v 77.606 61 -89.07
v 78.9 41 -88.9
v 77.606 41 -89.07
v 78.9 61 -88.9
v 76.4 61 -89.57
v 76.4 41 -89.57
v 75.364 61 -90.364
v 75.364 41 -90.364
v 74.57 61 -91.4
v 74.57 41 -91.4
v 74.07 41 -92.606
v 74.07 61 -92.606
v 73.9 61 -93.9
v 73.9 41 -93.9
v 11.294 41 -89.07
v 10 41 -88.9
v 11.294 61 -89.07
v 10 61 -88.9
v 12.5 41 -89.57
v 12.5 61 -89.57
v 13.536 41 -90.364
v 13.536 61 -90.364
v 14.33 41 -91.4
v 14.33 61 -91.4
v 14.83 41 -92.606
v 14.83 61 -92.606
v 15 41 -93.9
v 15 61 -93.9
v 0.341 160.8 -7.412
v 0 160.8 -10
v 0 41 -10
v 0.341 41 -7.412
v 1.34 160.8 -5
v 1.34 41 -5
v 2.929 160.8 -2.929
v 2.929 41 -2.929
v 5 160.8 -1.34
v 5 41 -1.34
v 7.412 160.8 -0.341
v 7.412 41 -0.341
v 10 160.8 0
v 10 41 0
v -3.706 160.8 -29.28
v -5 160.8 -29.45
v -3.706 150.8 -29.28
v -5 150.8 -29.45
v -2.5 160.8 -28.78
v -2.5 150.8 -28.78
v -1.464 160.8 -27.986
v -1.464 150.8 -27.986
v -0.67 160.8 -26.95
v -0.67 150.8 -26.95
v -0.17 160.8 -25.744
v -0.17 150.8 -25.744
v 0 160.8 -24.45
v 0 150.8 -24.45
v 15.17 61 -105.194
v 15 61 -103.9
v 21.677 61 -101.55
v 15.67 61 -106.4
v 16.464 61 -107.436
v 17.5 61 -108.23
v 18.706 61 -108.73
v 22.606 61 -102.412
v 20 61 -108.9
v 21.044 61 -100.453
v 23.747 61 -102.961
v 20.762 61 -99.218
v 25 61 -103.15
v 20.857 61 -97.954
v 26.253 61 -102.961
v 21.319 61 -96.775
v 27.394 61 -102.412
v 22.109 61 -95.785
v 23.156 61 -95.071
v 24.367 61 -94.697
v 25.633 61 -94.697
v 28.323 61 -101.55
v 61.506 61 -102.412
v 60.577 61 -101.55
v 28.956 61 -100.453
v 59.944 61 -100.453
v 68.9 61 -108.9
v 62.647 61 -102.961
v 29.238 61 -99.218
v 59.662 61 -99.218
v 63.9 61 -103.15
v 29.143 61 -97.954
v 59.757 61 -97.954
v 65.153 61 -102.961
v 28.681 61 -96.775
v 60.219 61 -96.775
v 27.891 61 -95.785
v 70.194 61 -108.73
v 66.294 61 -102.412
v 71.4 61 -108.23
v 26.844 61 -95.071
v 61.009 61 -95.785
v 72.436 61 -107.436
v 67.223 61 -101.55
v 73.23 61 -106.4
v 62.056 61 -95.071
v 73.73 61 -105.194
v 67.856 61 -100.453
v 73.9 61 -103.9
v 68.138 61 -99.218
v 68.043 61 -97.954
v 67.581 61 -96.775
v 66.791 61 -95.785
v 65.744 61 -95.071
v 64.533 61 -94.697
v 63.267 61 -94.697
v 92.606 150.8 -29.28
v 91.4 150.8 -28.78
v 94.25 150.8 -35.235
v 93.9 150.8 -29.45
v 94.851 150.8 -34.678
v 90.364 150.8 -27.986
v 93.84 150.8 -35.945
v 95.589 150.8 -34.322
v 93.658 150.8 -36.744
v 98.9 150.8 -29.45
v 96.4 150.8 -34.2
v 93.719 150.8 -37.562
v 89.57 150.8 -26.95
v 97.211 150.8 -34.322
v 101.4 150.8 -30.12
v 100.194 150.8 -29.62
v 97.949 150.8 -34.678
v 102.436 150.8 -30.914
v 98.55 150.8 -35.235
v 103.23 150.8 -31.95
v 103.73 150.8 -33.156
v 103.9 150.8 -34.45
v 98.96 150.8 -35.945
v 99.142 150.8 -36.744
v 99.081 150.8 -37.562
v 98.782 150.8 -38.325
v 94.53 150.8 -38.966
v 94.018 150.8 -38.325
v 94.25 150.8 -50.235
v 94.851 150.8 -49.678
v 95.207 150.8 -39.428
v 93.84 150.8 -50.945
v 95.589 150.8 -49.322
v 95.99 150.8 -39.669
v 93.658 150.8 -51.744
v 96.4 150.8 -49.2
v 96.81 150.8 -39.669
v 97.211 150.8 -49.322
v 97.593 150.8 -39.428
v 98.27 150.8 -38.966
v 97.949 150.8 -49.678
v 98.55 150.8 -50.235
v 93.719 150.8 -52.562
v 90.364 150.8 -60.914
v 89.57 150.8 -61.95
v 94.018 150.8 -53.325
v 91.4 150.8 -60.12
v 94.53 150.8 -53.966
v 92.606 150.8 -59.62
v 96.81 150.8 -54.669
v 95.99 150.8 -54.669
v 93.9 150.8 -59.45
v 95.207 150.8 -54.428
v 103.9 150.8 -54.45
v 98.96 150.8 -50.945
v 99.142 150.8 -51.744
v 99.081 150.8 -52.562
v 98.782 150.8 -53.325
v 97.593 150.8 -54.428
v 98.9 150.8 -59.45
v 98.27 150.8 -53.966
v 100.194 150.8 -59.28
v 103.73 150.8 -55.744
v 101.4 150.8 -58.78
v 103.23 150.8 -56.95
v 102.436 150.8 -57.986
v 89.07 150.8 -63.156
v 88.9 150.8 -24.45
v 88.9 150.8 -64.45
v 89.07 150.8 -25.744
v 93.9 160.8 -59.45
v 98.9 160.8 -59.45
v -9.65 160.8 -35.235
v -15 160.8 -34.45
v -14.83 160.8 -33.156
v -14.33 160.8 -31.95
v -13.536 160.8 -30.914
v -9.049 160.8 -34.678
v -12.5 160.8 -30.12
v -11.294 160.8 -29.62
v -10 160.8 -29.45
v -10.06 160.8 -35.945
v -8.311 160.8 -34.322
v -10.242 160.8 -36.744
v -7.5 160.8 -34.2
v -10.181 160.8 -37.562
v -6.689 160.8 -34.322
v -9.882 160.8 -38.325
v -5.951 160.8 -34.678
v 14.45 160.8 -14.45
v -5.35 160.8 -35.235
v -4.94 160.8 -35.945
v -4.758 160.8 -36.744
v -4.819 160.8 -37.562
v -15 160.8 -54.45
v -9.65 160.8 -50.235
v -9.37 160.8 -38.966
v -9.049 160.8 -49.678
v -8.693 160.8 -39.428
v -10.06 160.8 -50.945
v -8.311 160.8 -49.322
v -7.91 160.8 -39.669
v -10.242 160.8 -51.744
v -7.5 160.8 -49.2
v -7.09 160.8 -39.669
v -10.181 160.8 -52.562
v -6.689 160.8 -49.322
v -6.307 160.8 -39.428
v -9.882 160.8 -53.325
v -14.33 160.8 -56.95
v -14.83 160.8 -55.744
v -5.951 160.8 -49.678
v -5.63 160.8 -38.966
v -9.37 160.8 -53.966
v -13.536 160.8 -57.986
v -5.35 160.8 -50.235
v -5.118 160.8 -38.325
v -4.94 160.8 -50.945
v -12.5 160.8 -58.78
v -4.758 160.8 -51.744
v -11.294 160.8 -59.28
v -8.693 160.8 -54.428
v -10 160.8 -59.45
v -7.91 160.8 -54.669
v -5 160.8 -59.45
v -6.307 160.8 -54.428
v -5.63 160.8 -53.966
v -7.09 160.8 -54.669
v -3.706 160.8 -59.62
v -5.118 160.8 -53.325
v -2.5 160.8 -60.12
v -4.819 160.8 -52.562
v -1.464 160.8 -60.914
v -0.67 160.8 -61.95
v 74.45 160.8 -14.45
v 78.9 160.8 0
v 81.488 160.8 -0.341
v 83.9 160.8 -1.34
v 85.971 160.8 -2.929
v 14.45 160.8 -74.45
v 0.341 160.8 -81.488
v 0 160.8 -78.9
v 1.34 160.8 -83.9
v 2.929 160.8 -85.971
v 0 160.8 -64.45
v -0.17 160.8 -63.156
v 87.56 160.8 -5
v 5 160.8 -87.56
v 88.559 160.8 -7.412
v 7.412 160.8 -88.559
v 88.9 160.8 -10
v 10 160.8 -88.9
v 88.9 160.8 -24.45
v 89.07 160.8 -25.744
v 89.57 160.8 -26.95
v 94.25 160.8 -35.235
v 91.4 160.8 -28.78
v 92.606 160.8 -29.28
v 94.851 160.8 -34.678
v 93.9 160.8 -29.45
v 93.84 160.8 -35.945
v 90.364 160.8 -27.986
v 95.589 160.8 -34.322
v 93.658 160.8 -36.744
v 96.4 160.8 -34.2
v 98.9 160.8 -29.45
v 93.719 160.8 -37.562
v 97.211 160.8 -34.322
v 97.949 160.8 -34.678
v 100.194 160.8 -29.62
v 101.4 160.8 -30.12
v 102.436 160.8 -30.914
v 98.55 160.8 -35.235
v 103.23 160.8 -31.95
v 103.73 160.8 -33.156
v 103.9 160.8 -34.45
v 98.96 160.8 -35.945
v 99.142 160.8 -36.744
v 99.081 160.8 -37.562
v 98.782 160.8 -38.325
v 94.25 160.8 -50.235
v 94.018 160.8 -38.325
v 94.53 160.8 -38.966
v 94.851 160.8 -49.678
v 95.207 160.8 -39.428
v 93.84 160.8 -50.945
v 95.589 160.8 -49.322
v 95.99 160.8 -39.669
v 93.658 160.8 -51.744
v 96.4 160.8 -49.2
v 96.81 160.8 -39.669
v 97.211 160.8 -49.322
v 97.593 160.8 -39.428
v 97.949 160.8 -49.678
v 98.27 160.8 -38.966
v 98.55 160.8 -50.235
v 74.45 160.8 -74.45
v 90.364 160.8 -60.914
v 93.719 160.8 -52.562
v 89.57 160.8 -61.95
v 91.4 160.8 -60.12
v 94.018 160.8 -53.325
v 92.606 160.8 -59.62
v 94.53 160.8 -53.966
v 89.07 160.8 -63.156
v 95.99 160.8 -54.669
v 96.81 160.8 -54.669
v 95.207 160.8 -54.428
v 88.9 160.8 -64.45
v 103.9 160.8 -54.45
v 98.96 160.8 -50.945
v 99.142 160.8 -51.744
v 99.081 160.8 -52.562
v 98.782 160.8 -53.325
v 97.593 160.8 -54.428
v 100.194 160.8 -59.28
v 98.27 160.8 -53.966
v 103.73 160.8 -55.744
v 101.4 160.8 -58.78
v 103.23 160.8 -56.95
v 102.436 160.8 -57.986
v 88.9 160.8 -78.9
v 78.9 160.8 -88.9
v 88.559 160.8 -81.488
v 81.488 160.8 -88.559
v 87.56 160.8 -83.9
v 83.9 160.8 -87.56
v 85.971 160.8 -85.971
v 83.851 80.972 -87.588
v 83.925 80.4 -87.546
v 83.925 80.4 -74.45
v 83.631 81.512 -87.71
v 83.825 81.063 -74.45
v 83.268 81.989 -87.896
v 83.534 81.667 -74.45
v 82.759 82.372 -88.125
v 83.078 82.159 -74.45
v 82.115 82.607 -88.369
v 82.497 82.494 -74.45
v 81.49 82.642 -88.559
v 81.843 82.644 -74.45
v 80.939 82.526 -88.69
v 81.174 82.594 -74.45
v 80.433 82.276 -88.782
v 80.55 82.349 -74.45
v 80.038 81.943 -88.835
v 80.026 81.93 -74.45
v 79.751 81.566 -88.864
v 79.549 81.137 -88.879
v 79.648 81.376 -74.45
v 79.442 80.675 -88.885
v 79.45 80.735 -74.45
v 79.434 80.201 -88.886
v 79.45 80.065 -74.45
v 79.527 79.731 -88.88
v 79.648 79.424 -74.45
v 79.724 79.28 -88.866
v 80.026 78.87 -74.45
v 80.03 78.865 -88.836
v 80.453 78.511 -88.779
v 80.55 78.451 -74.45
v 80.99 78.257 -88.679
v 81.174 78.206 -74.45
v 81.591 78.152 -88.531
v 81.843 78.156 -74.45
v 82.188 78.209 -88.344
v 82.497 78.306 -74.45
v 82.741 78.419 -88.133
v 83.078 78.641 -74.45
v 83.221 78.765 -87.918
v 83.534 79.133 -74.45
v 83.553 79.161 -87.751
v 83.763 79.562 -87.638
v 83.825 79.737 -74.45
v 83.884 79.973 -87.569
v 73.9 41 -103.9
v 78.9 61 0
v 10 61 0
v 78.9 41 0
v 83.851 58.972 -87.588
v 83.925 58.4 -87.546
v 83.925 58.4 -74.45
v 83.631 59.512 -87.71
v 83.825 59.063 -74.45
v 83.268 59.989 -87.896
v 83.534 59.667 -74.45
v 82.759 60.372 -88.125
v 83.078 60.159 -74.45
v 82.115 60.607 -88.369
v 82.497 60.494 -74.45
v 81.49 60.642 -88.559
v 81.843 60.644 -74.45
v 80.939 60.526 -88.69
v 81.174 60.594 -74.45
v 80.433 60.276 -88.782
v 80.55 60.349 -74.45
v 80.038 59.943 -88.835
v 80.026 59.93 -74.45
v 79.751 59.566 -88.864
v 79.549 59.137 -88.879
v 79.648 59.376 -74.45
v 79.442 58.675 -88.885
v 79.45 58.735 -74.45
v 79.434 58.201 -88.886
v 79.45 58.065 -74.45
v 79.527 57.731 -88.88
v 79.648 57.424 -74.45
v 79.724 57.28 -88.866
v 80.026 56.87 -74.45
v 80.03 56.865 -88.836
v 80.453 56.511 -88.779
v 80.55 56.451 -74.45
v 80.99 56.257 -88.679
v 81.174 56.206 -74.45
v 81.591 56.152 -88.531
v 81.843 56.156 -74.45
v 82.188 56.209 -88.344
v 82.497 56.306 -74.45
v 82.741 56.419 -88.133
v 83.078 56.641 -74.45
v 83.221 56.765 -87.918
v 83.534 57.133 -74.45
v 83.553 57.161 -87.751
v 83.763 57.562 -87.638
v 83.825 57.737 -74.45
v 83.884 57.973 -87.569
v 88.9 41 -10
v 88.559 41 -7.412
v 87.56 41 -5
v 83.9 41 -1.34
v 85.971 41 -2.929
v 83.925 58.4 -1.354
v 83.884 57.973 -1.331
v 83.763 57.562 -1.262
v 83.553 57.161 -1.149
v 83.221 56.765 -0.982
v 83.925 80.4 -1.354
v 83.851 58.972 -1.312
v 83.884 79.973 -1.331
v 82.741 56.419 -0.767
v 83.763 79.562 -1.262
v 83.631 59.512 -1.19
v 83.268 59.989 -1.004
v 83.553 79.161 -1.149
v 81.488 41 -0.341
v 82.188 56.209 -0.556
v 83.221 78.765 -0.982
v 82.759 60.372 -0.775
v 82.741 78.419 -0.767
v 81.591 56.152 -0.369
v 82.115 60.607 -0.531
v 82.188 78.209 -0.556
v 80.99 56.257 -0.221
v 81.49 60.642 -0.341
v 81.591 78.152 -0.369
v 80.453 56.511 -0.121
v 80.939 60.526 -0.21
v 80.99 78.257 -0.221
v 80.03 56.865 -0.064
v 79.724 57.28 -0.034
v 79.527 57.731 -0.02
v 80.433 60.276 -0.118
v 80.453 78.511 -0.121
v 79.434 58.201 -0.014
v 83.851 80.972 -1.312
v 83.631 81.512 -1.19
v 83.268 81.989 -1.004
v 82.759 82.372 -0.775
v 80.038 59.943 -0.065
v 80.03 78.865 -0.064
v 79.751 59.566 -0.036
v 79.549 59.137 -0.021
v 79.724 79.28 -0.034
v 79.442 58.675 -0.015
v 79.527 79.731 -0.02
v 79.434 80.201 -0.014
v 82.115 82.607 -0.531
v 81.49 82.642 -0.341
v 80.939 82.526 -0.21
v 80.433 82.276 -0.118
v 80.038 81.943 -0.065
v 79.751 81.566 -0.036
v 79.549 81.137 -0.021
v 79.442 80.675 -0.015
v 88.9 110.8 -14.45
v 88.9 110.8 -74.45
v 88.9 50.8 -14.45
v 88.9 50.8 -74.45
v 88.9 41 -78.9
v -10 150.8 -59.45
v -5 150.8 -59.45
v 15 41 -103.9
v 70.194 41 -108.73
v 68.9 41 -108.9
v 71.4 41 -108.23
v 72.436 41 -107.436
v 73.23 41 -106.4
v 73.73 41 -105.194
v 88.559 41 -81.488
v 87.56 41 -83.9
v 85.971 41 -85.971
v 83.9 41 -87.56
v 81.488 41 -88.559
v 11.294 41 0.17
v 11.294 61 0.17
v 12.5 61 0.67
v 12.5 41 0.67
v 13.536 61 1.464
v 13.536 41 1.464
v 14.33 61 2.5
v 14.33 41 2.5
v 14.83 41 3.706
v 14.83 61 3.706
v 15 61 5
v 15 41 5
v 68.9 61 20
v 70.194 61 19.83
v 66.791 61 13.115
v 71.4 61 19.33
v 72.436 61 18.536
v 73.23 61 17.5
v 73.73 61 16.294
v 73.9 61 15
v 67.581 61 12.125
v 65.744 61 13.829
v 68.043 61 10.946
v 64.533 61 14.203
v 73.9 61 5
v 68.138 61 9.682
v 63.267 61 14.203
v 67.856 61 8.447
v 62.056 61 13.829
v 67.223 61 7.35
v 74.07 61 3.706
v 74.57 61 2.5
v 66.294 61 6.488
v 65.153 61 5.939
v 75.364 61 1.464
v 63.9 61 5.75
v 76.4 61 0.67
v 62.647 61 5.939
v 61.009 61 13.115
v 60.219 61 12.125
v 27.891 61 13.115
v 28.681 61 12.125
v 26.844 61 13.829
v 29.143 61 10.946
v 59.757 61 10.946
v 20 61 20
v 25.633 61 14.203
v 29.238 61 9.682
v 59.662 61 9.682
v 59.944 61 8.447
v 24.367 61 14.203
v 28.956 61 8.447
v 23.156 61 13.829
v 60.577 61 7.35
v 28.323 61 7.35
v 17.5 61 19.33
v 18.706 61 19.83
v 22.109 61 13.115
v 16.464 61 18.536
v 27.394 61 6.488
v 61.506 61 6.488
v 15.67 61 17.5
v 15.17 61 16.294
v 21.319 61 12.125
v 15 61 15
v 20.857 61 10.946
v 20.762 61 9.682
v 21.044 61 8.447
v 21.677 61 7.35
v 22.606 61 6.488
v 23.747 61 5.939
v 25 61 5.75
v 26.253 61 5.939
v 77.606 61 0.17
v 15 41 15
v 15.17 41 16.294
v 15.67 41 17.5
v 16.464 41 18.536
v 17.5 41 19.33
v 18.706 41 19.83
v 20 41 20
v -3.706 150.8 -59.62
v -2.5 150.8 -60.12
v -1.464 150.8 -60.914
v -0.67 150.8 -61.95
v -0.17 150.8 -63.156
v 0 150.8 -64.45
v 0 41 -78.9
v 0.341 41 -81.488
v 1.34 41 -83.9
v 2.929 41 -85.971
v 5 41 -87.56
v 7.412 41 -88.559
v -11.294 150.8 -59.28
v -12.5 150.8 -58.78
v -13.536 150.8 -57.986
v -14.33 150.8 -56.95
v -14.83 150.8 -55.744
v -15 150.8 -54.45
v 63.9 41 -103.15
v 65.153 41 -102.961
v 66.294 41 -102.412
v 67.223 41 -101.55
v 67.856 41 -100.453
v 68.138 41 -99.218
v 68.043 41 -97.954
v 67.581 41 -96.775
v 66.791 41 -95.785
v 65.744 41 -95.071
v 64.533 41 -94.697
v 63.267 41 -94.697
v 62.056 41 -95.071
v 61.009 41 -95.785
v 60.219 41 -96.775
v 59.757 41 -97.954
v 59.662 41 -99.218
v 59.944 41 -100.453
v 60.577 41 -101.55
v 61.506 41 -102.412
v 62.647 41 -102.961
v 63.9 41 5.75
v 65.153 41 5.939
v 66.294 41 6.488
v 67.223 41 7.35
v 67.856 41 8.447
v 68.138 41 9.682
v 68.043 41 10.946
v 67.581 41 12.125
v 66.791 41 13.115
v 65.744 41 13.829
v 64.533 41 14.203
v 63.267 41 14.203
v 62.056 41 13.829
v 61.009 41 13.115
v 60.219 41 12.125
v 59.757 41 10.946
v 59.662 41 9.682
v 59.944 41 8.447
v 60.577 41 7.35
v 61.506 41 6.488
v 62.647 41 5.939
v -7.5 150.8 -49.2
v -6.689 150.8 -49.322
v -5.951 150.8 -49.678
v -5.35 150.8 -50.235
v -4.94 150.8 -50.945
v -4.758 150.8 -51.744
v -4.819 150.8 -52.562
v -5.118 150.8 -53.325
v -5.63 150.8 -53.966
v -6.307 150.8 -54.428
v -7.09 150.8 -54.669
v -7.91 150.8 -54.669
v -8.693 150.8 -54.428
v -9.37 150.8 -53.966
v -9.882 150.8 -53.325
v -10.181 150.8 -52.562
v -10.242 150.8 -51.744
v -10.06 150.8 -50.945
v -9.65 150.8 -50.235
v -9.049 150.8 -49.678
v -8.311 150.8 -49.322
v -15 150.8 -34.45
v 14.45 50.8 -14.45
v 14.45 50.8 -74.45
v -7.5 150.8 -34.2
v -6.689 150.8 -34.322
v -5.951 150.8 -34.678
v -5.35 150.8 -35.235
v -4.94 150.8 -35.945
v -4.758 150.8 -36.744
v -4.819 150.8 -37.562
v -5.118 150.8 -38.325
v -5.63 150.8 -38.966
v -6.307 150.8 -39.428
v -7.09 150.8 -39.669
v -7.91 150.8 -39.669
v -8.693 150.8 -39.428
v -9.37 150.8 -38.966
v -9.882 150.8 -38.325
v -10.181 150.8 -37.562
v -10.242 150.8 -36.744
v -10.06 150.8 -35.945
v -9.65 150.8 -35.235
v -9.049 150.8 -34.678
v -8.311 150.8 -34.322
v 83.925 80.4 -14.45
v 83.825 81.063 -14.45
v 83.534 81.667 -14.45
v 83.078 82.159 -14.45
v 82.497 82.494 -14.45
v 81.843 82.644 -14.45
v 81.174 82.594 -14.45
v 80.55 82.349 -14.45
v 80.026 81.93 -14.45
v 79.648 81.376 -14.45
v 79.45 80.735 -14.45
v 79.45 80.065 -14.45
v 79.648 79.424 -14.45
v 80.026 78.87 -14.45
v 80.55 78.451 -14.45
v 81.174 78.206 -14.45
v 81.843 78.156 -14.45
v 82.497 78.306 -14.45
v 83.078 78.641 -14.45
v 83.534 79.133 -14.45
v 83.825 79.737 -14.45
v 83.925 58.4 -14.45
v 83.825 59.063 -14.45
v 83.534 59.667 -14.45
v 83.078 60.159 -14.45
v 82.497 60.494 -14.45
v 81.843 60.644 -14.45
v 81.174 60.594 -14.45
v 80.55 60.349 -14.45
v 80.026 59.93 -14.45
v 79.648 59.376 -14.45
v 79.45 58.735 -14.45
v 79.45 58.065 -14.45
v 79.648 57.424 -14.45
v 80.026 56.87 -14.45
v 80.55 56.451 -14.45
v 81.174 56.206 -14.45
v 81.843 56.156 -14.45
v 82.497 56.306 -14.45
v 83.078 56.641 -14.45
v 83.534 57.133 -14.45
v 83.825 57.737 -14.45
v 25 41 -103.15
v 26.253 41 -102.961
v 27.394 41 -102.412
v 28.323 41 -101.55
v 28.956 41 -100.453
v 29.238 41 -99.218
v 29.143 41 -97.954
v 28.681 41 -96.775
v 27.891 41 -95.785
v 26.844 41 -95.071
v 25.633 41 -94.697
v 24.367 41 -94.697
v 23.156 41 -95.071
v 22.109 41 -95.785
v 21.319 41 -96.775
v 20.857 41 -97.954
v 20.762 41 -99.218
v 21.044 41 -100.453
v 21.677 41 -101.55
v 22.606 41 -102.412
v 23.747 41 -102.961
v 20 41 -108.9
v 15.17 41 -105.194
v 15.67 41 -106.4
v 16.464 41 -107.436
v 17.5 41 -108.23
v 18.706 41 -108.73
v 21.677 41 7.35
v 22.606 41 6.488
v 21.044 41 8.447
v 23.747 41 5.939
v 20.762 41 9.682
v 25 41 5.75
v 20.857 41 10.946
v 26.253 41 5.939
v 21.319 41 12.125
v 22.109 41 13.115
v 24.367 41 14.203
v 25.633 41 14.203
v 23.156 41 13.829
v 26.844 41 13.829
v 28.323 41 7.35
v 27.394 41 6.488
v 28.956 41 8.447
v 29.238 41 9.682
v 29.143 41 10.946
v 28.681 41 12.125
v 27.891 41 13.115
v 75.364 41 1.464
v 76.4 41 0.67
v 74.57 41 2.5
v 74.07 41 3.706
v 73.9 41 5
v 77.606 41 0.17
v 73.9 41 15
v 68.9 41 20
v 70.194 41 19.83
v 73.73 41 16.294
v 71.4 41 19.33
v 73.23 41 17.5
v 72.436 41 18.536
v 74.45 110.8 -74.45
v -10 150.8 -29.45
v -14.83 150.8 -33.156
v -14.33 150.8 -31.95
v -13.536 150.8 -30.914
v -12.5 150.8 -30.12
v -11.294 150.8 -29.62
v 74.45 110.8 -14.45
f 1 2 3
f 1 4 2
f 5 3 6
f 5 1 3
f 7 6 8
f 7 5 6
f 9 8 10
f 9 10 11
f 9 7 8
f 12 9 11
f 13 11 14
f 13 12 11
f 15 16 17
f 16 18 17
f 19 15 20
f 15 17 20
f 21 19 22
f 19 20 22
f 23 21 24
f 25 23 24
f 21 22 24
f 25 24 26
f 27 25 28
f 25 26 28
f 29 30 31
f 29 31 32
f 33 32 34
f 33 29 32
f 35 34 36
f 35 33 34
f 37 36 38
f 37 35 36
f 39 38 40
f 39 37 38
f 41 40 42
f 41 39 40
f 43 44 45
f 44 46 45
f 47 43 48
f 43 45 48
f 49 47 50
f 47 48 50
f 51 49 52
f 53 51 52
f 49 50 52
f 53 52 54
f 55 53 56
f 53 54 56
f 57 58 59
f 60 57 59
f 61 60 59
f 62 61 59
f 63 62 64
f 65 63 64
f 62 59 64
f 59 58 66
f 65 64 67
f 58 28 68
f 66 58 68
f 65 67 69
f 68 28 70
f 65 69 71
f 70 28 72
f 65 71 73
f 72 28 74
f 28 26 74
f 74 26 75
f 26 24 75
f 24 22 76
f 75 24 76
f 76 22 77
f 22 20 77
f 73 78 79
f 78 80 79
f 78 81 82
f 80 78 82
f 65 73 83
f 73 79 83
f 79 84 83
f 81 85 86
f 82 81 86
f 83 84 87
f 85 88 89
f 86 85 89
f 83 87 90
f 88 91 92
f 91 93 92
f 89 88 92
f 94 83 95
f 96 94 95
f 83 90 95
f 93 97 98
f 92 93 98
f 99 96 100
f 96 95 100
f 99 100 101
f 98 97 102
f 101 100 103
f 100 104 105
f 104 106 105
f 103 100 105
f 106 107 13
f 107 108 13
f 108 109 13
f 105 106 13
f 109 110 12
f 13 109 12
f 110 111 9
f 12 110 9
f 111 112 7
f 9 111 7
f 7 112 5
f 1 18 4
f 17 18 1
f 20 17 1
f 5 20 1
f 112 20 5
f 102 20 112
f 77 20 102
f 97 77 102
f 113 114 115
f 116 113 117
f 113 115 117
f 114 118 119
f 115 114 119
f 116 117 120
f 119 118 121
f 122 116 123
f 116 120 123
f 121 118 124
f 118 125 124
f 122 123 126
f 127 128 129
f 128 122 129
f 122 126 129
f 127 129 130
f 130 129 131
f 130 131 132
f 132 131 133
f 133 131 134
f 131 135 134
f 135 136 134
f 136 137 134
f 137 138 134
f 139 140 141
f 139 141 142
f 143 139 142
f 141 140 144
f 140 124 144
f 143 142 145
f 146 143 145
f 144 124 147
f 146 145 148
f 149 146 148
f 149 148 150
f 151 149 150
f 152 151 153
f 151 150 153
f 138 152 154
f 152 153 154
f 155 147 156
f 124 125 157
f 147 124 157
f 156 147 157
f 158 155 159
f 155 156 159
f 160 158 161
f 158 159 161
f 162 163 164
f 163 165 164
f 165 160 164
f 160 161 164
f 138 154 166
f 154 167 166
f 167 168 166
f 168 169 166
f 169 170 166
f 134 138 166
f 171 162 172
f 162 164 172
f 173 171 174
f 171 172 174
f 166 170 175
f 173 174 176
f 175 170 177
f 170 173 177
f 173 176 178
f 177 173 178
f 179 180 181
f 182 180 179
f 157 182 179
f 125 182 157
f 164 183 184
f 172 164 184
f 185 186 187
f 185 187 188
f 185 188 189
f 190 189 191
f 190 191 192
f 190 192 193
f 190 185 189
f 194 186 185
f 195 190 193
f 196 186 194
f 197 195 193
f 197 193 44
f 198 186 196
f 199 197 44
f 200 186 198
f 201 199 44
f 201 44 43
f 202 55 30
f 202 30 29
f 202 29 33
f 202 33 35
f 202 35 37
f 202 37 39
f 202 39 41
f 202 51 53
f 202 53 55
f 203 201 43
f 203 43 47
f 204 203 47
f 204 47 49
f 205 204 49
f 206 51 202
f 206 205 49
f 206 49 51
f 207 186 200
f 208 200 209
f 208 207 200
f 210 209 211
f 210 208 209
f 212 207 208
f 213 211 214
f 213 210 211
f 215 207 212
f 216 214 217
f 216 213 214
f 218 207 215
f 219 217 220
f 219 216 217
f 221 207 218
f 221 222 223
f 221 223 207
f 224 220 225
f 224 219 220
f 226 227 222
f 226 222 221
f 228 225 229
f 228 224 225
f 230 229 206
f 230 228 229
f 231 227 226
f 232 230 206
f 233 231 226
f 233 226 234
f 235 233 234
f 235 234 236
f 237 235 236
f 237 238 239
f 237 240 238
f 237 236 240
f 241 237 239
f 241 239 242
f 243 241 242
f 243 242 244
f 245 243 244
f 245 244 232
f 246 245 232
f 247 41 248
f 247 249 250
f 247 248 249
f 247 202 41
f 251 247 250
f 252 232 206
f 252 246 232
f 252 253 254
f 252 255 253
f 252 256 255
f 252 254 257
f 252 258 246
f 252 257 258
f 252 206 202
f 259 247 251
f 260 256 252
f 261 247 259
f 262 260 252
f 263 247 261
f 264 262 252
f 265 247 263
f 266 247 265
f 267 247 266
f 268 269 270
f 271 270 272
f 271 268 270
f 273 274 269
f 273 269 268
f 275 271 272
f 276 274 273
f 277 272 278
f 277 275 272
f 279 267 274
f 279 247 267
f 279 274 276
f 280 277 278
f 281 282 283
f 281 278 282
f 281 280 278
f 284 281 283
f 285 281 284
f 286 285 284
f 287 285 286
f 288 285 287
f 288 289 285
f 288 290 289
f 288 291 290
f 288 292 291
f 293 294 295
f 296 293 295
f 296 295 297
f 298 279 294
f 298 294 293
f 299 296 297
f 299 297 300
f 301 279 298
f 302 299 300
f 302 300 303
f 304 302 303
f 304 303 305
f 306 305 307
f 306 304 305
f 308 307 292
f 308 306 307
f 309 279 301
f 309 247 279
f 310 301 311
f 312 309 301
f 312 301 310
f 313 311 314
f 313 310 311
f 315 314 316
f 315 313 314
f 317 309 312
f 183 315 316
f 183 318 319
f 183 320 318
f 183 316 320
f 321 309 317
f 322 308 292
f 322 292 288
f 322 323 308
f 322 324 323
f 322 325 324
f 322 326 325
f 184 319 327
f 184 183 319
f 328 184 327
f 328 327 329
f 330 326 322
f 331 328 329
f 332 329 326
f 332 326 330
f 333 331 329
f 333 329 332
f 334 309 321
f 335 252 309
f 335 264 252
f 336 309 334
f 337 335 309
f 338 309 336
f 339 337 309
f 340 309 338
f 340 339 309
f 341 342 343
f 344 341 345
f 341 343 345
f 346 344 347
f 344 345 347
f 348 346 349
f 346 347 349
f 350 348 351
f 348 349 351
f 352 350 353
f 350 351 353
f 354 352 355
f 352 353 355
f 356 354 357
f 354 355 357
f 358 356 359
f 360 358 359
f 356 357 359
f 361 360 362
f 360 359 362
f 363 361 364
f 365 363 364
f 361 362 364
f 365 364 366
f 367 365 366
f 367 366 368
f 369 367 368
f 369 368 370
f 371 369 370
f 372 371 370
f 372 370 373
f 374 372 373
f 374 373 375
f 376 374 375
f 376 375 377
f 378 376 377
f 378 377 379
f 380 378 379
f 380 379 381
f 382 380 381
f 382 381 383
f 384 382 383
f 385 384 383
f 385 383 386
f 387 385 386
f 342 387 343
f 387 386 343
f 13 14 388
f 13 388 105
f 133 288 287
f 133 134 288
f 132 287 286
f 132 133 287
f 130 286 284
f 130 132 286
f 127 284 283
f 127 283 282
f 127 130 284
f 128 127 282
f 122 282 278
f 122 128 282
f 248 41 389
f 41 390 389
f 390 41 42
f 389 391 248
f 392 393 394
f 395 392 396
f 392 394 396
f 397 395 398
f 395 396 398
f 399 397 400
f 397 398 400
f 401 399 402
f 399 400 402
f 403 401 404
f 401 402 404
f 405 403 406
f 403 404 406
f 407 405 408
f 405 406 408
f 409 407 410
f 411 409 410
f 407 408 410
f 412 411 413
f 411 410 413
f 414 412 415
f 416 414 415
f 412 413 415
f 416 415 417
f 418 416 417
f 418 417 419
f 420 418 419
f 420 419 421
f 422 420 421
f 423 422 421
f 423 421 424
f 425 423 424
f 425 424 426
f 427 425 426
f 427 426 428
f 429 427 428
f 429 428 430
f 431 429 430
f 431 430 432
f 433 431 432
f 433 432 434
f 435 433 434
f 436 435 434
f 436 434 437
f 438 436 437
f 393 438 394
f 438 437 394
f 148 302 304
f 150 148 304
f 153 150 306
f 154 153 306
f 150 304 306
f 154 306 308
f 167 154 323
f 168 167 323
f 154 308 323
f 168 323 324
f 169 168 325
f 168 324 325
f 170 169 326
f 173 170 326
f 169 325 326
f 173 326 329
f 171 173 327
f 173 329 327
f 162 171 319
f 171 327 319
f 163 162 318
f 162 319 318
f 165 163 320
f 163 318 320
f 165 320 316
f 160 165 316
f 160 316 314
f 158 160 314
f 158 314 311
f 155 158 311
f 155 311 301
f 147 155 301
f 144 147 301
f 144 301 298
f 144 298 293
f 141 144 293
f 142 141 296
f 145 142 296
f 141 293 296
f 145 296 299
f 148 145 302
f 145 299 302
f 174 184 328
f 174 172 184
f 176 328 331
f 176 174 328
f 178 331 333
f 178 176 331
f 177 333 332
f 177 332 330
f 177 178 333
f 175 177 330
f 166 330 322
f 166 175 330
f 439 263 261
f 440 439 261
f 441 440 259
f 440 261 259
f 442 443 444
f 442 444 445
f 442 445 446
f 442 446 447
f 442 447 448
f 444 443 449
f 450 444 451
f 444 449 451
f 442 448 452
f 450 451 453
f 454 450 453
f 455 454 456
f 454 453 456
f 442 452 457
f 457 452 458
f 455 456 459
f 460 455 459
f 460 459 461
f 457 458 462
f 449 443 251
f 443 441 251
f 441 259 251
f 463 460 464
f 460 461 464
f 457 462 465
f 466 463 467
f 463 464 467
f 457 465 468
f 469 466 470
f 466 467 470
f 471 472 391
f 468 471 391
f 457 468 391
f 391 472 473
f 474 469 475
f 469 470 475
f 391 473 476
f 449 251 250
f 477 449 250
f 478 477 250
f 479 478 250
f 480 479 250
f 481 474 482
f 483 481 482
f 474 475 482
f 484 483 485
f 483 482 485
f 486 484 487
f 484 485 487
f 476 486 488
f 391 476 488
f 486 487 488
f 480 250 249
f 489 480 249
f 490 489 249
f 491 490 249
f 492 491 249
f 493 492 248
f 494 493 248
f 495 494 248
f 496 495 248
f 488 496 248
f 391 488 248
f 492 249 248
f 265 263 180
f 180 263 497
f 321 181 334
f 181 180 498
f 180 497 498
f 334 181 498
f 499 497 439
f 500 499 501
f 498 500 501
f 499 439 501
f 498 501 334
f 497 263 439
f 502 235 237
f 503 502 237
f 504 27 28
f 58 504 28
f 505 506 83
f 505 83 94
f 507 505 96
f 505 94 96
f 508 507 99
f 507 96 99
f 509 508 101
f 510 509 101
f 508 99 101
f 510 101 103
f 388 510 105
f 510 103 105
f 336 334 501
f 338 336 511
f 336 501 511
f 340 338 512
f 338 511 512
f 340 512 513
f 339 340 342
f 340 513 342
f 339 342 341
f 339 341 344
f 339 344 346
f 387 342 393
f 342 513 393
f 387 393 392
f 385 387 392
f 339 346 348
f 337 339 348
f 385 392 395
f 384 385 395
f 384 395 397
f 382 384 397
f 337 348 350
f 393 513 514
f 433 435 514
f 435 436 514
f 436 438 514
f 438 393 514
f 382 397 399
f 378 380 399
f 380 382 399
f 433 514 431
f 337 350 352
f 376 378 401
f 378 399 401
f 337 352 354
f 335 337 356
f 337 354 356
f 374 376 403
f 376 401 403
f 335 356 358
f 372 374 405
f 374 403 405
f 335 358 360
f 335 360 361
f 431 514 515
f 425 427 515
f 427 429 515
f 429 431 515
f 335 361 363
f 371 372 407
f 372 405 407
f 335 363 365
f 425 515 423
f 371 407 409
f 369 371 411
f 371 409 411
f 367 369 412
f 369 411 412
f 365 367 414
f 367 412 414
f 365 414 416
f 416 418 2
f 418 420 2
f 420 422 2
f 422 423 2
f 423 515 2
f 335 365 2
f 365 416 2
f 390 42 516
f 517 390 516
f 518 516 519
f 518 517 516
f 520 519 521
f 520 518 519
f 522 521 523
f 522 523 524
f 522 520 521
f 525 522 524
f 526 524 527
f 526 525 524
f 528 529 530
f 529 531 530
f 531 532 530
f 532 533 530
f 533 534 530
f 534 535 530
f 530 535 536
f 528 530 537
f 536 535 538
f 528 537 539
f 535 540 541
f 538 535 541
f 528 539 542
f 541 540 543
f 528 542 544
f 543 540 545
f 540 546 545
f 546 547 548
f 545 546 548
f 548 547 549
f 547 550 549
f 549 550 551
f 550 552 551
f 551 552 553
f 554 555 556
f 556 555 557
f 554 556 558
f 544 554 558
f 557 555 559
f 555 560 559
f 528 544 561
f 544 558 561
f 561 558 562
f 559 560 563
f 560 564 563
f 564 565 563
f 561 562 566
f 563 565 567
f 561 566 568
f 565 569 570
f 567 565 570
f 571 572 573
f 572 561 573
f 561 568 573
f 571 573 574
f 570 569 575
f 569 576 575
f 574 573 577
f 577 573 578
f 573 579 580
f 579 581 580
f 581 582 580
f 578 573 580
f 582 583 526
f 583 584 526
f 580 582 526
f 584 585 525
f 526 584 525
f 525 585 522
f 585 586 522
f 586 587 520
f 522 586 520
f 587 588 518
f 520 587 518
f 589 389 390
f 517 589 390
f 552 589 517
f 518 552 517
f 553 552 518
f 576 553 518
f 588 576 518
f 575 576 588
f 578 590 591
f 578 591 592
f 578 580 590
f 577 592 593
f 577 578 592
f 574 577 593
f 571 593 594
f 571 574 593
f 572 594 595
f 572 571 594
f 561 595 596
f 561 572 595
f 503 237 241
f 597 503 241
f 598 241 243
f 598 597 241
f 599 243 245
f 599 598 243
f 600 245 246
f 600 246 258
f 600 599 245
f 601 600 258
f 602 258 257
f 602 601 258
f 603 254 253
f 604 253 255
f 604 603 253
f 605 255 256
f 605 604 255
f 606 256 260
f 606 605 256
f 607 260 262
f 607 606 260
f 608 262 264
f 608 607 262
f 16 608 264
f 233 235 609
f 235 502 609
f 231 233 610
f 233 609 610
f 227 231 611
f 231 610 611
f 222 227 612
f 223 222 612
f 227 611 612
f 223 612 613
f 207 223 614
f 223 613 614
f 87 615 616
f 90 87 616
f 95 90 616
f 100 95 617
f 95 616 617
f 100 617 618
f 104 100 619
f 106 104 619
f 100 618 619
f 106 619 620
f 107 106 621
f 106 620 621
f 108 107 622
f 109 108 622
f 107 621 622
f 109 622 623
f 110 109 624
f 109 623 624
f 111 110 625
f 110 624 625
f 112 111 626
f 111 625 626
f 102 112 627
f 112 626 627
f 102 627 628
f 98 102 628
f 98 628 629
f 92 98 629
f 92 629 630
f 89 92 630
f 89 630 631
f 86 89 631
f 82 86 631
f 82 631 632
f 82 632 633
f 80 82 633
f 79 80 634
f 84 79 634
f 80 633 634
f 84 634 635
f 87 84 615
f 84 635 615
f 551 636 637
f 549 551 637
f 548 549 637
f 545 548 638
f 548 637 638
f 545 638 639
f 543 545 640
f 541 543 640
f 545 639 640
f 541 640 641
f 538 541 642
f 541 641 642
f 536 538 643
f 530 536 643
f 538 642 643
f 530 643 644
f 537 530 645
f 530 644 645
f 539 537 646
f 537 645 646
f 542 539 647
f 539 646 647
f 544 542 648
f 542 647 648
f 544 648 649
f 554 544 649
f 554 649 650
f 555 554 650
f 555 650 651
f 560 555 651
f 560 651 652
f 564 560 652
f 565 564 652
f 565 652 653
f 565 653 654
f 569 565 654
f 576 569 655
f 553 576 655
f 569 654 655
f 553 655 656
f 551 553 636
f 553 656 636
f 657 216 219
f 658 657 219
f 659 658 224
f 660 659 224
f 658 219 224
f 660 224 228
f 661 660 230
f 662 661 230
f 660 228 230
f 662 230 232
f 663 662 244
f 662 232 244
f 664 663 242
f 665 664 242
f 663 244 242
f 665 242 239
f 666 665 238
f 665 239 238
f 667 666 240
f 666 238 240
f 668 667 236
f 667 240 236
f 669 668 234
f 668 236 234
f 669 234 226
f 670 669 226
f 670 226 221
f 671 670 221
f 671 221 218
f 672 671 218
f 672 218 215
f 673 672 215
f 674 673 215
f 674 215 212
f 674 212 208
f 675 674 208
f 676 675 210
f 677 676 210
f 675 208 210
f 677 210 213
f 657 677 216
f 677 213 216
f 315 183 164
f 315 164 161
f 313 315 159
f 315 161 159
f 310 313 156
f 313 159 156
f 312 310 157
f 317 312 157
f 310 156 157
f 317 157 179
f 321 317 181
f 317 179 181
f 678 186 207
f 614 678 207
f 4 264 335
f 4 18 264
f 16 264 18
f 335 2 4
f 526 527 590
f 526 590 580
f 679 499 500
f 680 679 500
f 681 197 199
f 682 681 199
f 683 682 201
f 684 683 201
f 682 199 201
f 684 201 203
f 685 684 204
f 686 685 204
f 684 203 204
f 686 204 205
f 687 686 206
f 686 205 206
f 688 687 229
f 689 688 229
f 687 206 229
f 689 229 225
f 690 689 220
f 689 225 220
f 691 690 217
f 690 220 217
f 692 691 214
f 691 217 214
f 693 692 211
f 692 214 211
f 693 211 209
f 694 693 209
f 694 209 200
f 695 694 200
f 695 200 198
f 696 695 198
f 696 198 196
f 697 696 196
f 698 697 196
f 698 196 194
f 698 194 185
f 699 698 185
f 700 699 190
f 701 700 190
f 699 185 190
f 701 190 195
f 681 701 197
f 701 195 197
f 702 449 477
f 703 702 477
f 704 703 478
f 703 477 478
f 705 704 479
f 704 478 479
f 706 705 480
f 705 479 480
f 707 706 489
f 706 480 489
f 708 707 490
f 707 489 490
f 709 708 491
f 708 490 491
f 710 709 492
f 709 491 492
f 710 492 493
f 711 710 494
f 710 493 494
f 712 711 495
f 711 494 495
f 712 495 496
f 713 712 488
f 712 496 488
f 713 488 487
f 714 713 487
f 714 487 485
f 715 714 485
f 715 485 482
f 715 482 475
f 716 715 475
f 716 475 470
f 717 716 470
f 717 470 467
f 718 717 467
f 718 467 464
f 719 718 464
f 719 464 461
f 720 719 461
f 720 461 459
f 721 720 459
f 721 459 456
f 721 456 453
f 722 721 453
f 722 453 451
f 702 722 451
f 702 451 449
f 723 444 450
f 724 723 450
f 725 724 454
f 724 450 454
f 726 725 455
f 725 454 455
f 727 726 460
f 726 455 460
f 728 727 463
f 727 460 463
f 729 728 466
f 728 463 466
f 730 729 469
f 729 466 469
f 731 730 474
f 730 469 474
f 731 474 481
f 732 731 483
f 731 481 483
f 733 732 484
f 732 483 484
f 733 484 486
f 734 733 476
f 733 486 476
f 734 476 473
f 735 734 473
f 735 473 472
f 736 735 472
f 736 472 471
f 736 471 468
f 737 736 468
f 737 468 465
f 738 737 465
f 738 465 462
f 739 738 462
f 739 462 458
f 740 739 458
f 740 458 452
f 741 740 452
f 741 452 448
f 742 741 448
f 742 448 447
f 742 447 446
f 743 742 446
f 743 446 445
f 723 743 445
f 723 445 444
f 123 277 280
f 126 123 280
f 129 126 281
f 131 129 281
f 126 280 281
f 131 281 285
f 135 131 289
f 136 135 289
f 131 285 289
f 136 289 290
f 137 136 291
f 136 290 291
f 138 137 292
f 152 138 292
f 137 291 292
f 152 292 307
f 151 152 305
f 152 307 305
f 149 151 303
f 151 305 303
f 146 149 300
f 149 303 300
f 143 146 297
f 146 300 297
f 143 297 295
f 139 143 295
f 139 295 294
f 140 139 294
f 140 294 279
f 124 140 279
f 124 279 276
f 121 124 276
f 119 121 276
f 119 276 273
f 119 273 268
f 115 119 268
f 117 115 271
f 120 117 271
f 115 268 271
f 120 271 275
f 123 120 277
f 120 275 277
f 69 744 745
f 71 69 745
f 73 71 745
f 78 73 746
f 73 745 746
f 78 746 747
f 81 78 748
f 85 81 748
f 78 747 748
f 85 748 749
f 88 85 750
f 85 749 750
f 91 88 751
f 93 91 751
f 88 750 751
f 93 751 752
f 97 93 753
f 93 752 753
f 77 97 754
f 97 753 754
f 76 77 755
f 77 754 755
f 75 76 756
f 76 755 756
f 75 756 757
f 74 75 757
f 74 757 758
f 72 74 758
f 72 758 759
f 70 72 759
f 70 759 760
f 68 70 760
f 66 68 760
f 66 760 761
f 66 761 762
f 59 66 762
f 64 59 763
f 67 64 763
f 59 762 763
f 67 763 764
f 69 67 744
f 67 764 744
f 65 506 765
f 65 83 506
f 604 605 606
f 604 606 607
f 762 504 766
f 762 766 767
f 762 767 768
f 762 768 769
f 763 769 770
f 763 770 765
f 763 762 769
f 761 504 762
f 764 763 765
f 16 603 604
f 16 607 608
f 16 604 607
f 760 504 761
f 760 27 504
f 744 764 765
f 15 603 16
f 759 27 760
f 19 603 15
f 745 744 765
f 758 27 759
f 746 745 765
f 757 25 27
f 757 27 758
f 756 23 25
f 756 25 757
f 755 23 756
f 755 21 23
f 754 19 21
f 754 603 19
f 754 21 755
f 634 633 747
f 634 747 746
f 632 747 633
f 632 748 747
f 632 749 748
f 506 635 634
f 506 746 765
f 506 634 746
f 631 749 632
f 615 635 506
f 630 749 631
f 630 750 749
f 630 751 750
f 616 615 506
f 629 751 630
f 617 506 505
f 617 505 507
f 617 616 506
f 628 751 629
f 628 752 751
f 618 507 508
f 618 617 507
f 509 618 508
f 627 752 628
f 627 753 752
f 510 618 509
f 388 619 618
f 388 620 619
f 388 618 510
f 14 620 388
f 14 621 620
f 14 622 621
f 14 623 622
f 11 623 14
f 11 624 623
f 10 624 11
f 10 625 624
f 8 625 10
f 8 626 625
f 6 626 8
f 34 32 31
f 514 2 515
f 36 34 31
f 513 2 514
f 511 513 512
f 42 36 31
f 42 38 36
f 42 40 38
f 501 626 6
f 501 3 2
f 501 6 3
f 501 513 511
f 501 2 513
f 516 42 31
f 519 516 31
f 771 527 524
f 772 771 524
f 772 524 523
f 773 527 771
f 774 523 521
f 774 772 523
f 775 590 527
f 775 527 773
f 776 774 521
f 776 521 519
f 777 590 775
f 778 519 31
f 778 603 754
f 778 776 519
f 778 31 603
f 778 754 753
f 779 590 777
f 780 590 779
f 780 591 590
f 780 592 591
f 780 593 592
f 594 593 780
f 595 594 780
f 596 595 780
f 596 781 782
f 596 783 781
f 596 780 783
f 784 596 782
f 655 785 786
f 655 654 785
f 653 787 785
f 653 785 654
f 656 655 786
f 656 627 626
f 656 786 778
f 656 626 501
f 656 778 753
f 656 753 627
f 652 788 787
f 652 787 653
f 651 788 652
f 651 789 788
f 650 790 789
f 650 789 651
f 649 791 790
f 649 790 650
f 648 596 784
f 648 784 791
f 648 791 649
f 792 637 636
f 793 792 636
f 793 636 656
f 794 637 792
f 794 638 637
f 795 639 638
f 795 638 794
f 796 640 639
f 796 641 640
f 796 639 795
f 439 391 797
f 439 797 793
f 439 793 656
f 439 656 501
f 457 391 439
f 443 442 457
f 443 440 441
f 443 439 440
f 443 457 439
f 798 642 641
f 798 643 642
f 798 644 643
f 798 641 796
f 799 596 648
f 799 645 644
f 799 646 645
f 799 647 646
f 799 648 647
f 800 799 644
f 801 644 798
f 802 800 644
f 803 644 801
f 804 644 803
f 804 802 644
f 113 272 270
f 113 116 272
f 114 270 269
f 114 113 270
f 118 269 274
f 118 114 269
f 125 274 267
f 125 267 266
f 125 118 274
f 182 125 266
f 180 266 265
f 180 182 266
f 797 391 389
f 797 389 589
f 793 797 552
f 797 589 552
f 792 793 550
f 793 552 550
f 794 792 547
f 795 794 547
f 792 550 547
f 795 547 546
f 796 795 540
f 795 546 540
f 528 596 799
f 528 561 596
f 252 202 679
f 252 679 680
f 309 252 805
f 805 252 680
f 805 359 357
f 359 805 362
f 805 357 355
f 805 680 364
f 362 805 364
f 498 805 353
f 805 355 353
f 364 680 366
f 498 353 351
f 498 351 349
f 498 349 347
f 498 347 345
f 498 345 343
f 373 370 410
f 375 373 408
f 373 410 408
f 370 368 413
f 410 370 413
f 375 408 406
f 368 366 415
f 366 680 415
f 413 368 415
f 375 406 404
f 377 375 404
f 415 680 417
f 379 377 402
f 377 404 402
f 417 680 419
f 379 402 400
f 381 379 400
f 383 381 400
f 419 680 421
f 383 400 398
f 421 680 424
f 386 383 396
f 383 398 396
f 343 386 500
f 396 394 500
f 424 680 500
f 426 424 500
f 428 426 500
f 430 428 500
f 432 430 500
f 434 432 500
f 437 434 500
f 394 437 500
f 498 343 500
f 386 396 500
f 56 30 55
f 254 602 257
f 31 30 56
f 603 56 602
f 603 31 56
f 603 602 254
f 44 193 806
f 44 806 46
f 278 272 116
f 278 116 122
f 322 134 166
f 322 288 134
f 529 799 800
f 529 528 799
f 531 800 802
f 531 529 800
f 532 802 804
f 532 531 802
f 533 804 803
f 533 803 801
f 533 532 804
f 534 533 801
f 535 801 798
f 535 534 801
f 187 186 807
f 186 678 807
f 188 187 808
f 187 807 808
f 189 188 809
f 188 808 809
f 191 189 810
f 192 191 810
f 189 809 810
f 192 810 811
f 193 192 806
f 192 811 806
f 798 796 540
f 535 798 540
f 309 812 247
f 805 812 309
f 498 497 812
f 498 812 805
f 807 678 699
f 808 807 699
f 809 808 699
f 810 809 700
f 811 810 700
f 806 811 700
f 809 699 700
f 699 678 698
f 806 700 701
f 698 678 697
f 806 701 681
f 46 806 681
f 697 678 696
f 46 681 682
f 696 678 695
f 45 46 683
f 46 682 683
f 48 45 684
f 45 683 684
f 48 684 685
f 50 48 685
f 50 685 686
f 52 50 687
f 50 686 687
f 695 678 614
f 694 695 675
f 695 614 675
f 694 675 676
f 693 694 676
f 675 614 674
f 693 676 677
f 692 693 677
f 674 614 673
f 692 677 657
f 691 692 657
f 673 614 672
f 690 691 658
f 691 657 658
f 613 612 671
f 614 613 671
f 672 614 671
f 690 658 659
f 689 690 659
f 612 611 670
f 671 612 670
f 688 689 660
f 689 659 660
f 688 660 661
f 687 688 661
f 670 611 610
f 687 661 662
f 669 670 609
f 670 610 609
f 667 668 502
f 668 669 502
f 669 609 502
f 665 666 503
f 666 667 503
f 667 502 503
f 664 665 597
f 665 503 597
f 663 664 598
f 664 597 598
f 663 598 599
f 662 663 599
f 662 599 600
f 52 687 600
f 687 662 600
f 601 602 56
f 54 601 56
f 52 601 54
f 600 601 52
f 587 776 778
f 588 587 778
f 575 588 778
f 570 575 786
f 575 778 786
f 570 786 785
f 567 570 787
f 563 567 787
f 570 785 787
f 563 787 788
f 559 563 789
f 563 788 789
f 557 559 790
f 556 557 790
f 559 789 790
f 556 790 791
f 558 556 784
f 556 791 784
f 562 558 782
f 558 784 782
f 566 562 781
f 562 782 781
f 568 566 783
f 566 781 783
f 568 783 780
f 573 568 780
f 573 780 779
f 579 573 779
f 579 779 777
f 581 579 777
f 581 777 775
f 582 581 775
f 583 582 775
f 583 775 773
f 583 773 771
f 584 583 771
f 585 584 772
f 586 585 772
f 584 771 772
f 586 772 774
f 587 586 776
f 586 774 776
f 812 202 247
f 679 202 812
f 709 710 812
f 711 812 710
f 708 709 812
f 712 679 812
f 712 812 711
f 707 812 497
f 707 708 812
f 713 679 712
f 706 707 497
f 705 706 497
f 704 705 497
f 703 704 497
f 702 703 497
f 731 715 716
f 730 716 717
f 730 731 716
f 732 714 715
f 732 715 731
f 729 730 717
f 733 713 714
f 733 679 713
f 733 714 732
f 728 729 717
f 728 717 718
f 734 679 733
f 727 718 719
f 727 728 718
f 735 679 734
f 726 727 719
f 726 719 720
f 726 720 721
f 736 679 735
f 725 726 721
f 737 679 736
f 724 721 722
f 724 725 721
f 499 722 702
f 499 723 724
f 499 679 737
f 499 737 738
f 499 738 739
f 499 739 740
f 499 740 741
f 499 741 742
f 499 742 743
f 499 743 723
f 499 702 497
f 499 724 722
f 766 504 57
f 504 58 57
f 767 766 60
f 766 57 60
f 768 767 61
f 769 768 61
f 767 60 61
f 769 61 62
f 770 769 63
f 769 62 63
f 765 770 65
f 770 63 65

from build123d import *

# Parameters (mm, degrees)
SKETCH3_W            = 88.9
SKETCH3_H            = 88.9
BOSS_EXTRUDE2_DEPTH  = 50.8
SKETCH13_R           = 4.25
CUT_EXTRUDE4_DEPTH   = 102
SKETCH30_W           = 88.9
SKETCH30_H           = 88.9
SKETCH30_W_2         = 60
SKETCH30_H_2         = 60
BOSS_EXTRUDE8_DEPTH  = 110
SKETCH31_W           = 15
SKETCH31_H           = 15
SKETCH31_R           = 2.75
BOSS_EXTRUDE10_DEPTH = 10
FILLET1_R            = 10
SKETCH33_W           = 60
SKETCH33_H           = 60
CUT_EXTRUDE5_DEPTH   = 20
SKETCH37_R           = 2.25
CUT_EXTRUDE6_DEPTH   = 113
SKETCH38_W           = 88.9
SKETCH38_H           = 88.9
CUT_EXTRUDE7_DEPTH   = 41
SKETCH39_W           = 29.45
SKETCH39_H           = 20
BOSS_EXTRUDE11_DEPTH = 20
SKETCH40_W           = 29.45
SKETCH40_H           = 20
BOSS_EXTRUDE12_DEPTH = 20
SKETCH41_R           = 4.25
CUT_EXTRUDE8_DEPTH   = 20
FILLET2_R            = 5
FILLET3_R            = 5


with BuildPart() as part:
    # Sketch3 → Boss-Extrude2 (new body)
    with BuildSketch(Plane(origin=(0, 0, 0), x_dir=(1, 0, 0), z_dir=(0, 1, 0))):
        with Locations((44.45, 44.45)):
            Rectangle(SKETCH3_W, SKETCH3_H)
    extrude(amount=BOSS_EXTRUDE2_DEPTH)

    # Sketch13 → Cut-Extrude4 (cut)
    with BuildSketch(Plane.XY):
        with Locations((44.45, 20)):
            Circle(SKETCH13_R)
    extrude(amount=-CUT_EXTRUDE4_DEPTH, mode=Mode.SUBTRACT)

    # Sketch30 → Boss-Extrude8 (add)
    with BuildSketch(Plane(origin=(0, 50.8, 0), x_dir=(1, 0, 0), z_dir=(0, 1, 0))):
        with Locations((44.45, 44.45)):
            Rectangle(SKETCH30_W, SKETCH30_H)
        with Locations((44.45, 44.45)):
            Rectangle(SKETCH30_W_2, SKETCH30_H_2, mode=Mode.SUBTRACT)
    extrude(amount=BOSS_EXTRUDE8_DEPTH)

    # Sketch31 → Boss-Extrude10 (add)
    # profile 1 of 4: a face of its own
    with BuildSketch(Plane(origin=(0, 160.8, 0), x_dir=(1, 0, 0), z_dir=(0, 1, 0))):
        with Locations((-7.5, 51.95)):
            Rectangle(SKETCH31_W, SKETCH31_H)
        with Locations(Location((-7.5, 51.95, 0), (0, 0, 270))):
            Circle(SKETCH31_R, mode=Mode.SUBTRACT)
    # profile 2 of 4: a face of its own
    with BuildSketch(Plane(origin=(0, 160.8, 0), x_dir=(1, 0, 0), z_dir=(0, 1, 0))):
        with Locations((-7.5, 36.95)):
            Rectangle(SKETCH31_W, SKETCH31_H)
        with Locations(Location((-7.5, 36.95, 0), (0, 0, 270))):
            Circle(SKETCH31_R, mode=Mode.SUBTRACT)
    # profile 3 of 4: a face of its own
    with BuildSketch(Plane(origin=(0, 160.8, 0), x_dir=(1, 0, 0), z_dir=(0, 1, 0))):
        with Locations((96.4, 51.95)):
            Rectangle(SKETCH31_W, SKETCH31_H)
        with Locations(Location((96.4, 51.95, 0), (0, 0, 270))):
            Circle(SKETCH31_R, mode=Mode.SUBTRACT)
    # profile 4 of 4: a face of its own
    with BuildSketch(Plane(origin=(0, 160.8, 0), x_dir=(1, 0, 0), z_dir=(0, 1, 0))):
        with Locations((96.4, 36.95)):
            Rectangle(SKETCH31_W, SKETCH31_H)
        with Locations(Location((96.4, 36.95, 0), (0, 0, 270))):
            Circle(SKETCH31_R, mode=Mode.SUBTRACT)
    extrude(amount=-BOSS_EXTRUDE10_DEPTH)

    # Fillet1
    fillet1_edges = [part.edges().sort_by_distance(p)[0] for p in [
        (0, 80.4, -88.9),
        (88.9, 80.4, -88.9),
        (88.9, 80.4, 0),
        (0, 80.4, 0),
    ]]
    fillet(fillet1_edges, radius=FILLET1_R)

    # Sketch33 → Cut-Extrude5 (cut)
    with BuildSketch(Plane(origin=(88.9, 0, 0), x_dir=(0, 0, -1), z_dir=(1, 0, 0))):
        with Locations((44.45, 80.8)):
            Rectangle(SKETCH33_W, SKETCH33_H)
    extrude(amount=-CUT_EXTRUDE5_DEPTH, mode=Mode.SUBTRACT)

    # Sketch37 → Cut-Extrude6 (cut)
    with BuildSketch(Plane.XY):
        with Locations((81.675, 80.4)):
            Circle(SKETCH37_R)
        with Locations((81.675, 58.4)):
            Circle(SKETCH37_R)
    extrude(amount=-CUT_EXTRUDE6_DEPTH, mode=Mode.SUBTRACT)

    # Sketch38 → Cut-Extrude7 (cut)
    with BuildSketch(Plane.XZ):
        with Locations((44.45, -44.45)):
            Rectangle(SKETCH38_W, SKETCH38_H)
    extrude(amount=-CUT_EXTRUDE7_DEPTH, mode=Mode.SUBTRACT)

    # Sketch39 → Boss-Extrude11 (add)
    with BuildSketch(Plane.XY):
        with Locations((29.725, 51)):
            Rectangle(SKETCH39_W, SKETCH39_H)
        with Locations((59.175, 51)):
            Rectangle(SKETCH39_W, SKETCH39_H)
    extrude(amount=BOSS_EXTRUDE11_DEPTH)

    # Sketch40 → Boss-Extrude12 (add)
    with BuildSketch(Plane(origin=(0, 0, -88.9), x_dir=(-1, 0, 0), z_dir=(0, 0, -1))):
        with Locations((-59.175, 51)):
            Rectangle(SKETCH40_W, SKETCH40_H)
        with Locations((-29.725, 51)):
            Rectangle(SKETCH40_W, SKETCH40_H)
    extrude(amount=BOSS_EXTRUDE12_DEPTH)

    # Sketch41 → Cut-Extrude8 (cut)
    with BuildSketch(Plane.XZ.offset(-41)):
        with Locations(Location((63.9, 10, 0), (0, 0, 270))):
            Circle(SKETCH41_R)
        with Locations(Location((25, 10, 0), (0, 0, 270))):
            Circle(SKETCH41_R)
        with Locations(Location((63.9, -98.9, 0), (0, 0, 270))):
            Circle(SKETCH41_R)
        with Locations(Location((25, -98.9, 0), (0, 0, 270))):
            Circle(SKETCH41_R)
    extrude(amount=-CUT_EXTRUDE8_DEPTH, mode=Mode.SUBTRACT)

    # Fillet2
    fillet2_edges = [part.edges().sort_by_distance(p)[0] for p in [
        (15, 51, -108.9),
        (15, 51, -88.9),
        (73.9, 51, -108.9),
        (73.9, 51, -88.9),
        (73.9, 51, 0),
        (15, 51, 0),
        (15, 51, 20),
        (73.9, 51, 20),
    ]]
    fillet(fillet2_edges, radius=FILLET2_R - 0.0001)  # a hair under: the kernel refuses the full size

    # Fillet3
    fillet3_edges = [part.edges().sort_by_distance(p)[0] for p in [
        (-15, 155.8, -29.45),
        (-15, 155.8, -59.45),
        (0, 155.8, -59.45),
        (0, 155.8, -29.45),
        (88.9, 155.8, -29.45),
        (88.9, 155.8, -59.45),
        (103.9, 155.8, -59.45),
        (103.9, 155.8, -29.45),
    ]]
    fillet(fillet3_edges, radius=FILLET3_R)


solid = part.part
